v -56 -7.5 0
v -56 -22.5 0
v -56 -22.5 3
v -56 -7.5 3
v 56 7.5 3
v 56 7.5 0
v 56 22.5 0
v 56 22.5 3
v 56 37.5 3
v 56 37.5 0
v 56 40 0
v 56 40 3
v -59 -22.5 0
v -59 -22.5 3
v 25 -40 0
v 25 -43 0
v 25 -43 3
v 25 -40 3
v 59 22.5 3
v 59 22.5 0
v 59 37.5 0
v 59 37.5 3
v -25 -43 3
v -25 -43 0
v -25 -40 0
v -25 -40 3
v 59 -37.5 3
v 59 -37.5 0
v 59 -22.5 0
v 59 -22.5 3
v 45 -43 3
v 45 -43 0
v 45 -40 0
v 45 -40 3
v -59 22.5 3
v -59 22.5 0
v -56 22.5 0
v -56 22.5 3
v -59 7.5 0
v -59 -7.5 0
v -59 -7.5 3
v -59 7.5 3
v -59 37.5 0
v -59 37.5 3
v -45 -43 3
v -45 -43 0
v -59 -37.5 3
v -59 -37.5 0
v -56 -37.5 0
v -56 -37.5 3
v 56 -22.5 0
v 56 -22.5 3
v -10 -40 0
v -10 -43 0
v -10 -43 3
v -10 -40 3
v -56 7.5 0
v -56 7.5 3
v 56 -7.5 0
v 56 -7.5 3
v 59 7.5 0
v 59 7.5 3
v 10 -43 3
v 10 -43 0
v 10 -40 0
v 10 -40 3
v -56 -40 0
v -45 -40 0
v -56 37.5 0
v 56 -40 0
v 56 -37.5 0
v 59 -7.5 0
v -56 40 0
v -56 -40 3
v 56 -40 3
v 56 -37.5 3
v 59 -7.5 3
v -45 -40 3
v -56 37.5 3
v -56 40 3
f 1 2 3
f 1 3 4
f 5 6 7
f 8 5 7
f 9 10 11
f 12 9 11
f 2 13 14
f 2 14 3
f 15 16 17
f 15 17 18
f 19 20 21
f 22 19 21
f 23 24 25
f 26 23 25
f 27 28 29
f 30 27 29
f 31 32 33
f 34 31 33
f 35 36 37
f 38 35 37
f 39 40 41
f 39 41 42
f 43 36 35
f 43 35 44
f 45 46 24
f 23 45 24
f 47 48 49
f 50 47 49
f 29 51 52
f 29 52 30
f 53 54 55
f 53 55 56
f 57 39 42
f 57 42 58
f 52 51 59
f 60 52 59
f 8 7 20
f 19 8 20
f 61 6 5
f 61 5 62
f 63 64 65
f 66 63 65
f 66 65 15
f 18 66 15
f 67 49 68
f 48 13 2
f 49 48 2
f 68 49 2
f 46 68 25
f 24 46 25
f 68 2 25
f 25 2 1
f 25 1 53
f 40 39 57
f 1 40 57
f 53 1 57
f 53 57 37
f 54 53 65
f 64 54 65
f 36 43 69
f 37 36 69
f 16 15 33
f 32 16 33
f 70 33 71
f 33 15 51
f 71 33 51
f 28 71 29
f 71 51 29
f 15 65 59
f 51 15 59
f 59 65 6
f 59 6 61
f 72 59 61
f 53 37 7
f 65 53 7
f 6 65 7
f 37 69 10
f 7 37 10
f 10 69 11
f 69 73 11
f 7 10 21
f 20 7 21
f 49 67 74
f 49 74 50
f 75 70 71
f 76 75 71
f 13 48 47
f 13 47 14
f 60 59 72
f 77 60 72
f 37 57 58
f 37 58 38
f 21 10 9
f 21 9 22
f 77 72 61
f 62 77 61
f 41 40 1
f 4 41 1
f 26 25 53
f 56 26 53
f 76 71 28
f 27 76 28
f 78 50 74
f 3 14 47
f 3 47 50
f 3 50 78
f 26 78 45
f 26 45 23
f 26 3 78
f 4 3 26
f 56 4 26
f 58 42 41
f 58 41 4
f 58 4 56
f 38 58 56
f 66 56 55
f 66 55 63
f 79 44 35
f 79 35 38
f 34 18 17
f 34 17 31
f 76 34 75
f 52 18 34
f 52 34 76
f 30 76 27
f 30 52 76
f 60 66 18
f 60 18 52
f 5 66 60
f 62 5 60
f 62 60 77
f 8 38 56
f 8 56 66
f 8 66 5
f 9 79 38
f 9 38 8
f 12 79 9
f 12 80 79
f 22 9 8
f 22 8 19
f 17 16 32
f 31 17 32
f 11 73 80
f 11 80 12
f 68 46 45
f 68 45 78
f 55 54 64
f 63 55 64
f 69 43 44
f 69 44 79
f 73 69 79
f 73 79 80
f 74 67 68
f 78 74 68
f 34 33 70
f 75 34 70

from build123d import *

# Parameters (mm, degrees)
SKETCH2_W           = 112
SKETCH2_H           = 80
SKETCH2_W_2         = 20
SKETCH2_H_2         = 3
SKETCH2_W_3         = 3
SKETCH2_H_3         = 15
BOSS_EXTRUDE1_DEPTH = 3


with BuildPart() as part:
    # Sketch2 → Boss-Extrude1 (new body)
    with BuildSketch(Plane.XY):
        Rectangle(SKETCH2_W, SKETCH2_H)
        with Locations((-35, -41.5)):
            Rectangle(SKETCH2_W_2, SKETCH2_H_2)
        with Locations((0, -41.5)):
            Rectangle(SKETCH2_W_2, SKETCH2_H_2)
        with Locations((35, -41.5)):
            Rectangle(SKETCH2_W_2, SKETCH2_H_2)
        with Locations((57.5, -30)):
            Rectangle(SKETCH2_W_3, SKETCH2_H_3)
        with Locations((-57.5, -30)):
            Rectangle(SKETCH2_W_3, SKETCH2_H_3)
        with Locations((-57.5, 0)):
            Rectangle(SKETCH2_W_3, SKETCH2_H_3)
        with Locations((57.5, 0)):
            Rectangle(SKETCH2_W_3, SKETCH2_H_3)
        with Locations((-57.5, 30)):
            Rectangle(SKETCH2_W_3, SKETCH2_H_3)
        with Locations((57.5, 30)):
            Rectangle(SKETCH2_W_3, SKETCH2_H_3)
    extrude(amount=BOSS_EXTRUDE1_DEPTH)


solid = part.part
